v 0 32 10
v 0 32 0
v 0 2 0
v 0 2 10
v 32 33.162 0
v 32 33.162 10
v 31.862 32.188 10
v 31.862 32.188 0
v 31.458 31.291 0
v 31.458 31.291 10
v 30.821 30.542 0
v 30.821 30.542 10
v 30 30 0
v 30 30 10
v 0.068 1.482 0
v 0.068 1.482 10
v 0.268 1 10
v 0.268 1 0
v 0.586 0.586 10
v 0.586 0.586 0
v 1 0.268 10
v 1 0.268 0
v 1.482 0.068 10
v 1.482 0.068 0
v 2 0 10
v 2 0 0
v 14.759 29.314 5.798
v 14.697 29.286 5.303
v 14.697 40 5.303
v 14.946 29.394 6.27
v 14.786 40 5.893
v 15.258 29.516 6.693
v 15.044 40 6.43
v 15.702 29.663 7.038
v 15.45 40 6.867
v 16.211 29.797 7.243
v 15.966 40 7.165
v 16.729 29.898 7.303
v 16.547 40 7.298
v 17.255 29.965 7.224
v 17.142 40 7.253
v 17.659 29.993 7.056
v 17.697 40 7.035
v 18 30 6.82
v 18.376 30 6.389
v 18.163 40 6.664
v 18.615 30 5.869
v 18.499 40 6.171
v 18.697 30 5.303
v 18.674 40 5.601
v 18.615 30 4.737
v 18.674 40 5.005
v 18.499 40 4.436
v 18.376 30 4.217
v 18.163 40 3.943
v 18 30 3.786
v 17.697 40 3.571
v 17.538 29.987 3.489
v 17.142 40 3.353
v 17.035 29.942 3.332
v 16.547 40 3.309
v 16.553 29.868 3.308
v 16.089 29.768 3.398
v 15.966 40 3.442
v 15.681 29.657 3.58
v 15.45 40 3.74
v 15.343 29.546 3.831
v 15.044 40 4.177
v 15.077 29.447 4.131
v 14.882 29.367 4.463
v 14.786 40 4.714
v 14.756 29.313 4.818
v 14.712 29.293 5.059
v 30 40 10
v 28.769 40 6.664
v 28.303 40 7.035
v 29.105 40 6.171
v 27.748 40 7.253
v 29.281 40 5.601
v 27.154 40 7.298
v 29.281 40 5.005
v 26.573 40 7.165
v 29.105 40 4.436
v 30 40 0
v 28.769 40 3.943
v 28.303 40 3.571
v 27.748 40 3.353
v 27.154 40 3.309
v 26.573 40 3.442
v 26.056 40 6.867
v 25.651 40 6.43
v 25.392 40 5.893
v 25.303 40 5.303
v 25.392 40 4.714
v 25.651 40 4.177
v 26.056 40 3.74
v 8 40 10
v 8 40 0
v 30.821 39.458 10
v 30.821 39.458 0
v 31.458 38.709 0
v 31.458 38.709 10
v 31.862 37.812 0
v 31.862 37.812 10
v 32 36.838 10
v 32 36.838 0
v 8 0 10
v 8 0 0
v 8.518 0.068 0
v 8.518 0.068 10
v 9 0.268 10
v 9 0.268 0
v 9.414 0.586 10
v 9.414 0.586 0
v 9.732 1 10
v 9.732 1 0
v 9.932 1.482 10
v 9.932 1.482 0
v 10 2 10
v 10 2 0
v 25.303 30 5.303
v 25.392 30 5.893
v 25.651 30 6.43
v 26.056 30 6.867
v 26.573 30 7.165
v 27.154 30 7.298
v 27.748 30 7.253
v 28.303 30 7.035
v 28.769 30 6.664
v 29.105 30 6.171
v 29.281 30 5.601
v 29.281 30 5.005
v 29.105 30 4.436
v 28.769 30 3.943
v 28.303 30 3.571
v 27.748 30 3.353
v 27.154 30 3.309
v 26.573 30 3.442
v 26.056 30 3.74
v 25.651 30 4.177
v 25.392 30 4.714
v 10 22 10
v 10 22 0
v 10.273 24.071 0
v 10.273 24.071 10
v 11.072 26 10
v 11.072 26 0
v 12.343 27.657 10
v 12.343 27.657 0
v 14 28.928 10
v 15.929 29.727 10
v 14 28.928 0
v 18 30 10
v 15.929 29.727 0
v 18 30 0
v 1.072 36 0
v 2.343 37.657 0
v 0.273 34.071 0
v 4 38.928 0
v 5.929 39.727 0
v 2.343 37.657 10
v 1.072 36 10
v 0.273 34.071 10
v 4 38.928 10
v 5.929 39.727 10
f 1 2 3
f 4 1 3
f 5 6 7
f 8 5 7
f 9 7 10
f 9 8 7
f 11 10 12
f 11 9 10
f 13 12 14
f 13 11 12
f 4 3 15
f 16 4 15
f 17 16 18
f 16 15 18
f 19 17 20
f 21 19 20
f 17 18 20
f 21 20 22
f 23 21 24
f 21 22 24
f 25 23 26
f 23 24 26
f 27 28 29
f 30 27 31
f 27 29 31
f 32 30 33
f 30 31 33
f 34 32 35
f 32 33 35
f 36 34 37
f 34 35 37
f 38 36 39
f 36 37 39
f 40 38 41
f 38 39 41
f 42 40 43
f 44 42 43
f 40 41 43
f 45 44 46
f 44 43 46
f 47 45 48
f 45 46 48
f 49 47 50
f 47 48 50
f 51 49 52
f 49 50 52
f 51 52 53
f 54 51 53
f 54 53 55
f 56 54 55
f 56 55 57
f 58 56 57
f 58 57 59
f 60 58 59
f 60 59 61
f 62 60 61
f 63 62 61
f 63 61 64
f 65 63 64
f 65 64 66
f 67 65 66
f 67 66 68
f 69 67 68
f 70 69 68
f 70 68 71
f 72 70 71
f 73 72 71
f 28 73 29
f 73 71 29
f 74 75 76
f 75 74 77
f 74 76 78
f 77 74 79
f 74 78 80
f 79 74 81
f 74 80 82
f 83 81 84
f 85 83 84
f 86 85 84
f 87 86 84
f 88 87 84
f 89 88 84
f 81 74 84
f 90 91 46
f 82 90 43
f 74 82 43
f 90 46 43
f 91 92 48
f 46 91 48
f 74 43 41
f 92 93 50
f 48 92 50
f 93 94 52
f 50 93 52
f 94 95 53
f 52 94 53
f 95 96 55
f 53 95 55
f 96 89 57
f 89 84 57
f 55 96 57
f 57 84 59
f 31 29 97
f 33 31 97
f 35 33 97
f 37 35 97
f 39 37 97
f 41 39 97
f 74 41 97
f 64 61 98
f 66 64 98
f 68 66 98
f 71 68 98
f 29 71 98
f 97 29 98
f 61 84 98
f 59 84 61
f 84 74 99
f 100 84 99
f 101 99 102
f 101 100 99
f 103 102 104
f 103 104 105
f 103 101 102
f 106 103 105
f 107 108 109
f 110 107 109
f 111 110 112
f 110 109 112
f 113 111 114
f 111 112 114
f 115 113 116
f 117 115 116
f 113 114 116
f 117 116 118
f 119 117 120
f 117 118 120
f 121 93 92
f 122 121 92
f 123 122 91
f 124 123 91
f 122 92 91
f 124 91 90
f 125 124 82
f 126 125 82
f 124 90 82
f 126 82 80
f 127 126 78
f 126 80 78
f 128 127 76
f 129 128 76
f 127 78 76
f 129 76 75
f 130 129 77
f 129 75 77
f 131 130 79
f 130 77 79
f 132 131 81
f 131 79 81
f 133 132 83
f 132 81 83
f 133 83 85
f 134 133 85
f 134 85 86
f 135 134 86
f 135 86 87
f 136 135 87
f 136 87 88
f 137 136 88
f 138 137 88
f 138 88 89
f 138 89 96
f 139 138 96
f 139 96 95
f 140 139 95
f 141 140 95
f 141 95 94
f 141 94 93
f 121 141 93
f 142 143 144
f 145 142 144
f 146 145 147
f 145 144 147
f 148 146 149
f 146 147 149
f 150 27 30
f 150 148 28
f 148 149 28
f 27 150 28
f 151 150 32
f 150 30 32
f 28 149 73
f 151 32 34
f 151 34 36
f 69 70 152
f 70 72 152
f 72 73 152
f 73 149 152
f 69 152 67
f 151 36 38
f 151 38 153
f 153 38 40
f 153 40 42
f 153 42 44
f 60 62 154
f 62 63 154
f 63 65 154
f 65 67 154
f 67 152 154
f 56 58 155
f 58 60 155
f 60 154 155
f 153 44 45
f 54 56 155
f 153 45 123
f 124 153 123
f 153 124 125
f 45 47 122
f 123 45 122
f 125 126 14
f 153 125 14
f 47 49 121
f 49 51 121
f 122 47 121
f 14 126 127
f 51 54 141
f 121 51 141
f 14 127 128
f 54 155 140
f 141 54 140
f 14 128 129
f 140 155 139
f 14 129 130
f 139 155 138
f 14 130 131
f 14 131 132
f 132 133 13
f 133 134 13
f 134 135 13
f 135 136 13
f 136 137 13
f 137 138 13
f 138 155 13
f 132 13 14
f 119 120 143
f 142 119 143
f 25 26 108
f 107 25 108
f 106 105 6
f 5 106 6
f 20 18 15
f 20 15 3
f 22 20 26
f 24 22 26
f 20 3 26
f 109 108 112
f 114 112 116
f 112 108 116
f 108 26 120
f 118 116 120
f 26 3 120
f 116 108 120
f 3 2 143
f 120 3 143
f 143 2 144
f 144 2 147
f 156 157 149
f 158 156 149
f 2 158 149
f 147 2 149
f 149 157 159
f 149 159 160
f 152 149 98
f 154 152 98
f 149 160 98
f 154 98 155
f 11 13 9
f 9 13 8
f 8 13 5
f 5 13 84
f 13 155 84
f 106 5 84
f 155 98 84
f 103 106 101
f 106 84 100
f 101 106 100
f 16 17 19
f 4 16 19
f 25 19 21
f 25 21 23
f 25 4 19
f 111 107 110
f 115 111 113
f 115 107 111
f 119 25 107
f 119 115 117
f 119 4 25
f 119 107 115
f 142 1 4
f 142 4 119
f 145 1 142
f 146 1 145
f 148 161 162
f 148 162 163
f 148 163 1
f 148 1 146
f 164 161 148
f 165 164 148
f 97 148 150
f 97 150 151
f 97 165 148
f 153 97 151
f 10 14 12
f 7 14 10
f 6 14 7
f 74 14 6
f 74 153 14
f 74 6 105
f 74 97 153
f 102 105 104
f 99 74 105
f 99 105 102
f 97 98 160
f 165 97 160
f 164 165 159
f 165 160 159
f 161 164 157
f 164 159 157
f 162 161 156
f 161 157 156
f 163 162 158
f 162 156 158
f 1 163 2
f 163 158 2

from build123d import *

# Parameters (mm, degrees)
SALIENTE_EXTRUIR1_DEPTH = 10
CROQUIS2_R              = 2
CORTAR_EXTRUIR2_DEPTH   = 30
CORTAR_EXTRUIR3_START   = -10
CORTAR_EXTRUIR3_DEPTH   = 10


with BuildPart() as part:
    # Croquis1 → Saliente-Extruir1 (new body)
    with BuildSketch(Plane.XY):
        with BuildLine():
            Line((2, 0), (8, 0))
            ThreePointArc((8, 0), (9.414213562, 0.585786438), (10, 2))
            Line((10, 2), (10, 22))
            ThreePointArc((10, 22), (12.343145751, 27.656854249), (18, 30))
            Line((18, 30), (36, 30))
            ThreePointArc((36, 30), (38.828427125, 31.171572875), (40, 34))
            Line((40, 34), (40, 36))
            ThreePointArc((40, 36), (38.828427125, 38.828427125), (36, 40))
            Line((36, 40), (8, 40))
            ThreePointArc((8, 40), (2.343145751, 37.656854249), (0, 32))
            Line((0, 32), (0, 2))
            ThreePointArc((0, 2), (0.585786438, 0.585786438), (2, 0))
        make_face()
    extrude(amount=SALIENTE_EXTRUIR1_DEPTH)

    # Croquis2 → Cortar-Extruir2 (cut)
    with BuildSketch(Plane(origin=(0, 40, 0), x_dir=(1, 0, 0), z_dir=(0, 1, 0))):
        with Locations(Location((16.696699141, -5.303300859, 0), (0, 0, 180))):
            Circle(CROQUIS2_R)
        with Locations(Location((27.303300859, -5.303300859, 0), (0, 0, 180))):
            Circle(CROQUIS2_R)
    extrude(amount=-CORTAR_EXTRUIR2_DEPTH, mode=Mode.SUBTRACT)

    # Croquis3 → Cortar-Extruir3 (cut)
    with BuildSketch(Plane.XY.offset(10).offset(CORTAR_EXTRUIR3_START)):
        with BuildLine():
            Line((32, 36.83772234), (32, 33.16227766))
            ThreePointArc((32, 33.16227766), (31.458039892, 31.291448967), (30, 30))
            Line((30, 30), (36, 30))
            ThreePointArc((36, 30), (38.828427125, 31.171572875), (40, 34))
            Line((40, 34), (40, 36))
            ThreePointArc((40, 36), (38.828427125, 38.828427125), (36, 40))
            Line((36, 40), (30, 40))
            ThreePointArc((30, 40), (31.458039892, 38.708551033), (32, 36.83772234))
        make_face()
    extrude(amount=CORTAR_EXTRUIR3_DEPTH, mode=Mode.SUBTRACT)


solid = part.part
